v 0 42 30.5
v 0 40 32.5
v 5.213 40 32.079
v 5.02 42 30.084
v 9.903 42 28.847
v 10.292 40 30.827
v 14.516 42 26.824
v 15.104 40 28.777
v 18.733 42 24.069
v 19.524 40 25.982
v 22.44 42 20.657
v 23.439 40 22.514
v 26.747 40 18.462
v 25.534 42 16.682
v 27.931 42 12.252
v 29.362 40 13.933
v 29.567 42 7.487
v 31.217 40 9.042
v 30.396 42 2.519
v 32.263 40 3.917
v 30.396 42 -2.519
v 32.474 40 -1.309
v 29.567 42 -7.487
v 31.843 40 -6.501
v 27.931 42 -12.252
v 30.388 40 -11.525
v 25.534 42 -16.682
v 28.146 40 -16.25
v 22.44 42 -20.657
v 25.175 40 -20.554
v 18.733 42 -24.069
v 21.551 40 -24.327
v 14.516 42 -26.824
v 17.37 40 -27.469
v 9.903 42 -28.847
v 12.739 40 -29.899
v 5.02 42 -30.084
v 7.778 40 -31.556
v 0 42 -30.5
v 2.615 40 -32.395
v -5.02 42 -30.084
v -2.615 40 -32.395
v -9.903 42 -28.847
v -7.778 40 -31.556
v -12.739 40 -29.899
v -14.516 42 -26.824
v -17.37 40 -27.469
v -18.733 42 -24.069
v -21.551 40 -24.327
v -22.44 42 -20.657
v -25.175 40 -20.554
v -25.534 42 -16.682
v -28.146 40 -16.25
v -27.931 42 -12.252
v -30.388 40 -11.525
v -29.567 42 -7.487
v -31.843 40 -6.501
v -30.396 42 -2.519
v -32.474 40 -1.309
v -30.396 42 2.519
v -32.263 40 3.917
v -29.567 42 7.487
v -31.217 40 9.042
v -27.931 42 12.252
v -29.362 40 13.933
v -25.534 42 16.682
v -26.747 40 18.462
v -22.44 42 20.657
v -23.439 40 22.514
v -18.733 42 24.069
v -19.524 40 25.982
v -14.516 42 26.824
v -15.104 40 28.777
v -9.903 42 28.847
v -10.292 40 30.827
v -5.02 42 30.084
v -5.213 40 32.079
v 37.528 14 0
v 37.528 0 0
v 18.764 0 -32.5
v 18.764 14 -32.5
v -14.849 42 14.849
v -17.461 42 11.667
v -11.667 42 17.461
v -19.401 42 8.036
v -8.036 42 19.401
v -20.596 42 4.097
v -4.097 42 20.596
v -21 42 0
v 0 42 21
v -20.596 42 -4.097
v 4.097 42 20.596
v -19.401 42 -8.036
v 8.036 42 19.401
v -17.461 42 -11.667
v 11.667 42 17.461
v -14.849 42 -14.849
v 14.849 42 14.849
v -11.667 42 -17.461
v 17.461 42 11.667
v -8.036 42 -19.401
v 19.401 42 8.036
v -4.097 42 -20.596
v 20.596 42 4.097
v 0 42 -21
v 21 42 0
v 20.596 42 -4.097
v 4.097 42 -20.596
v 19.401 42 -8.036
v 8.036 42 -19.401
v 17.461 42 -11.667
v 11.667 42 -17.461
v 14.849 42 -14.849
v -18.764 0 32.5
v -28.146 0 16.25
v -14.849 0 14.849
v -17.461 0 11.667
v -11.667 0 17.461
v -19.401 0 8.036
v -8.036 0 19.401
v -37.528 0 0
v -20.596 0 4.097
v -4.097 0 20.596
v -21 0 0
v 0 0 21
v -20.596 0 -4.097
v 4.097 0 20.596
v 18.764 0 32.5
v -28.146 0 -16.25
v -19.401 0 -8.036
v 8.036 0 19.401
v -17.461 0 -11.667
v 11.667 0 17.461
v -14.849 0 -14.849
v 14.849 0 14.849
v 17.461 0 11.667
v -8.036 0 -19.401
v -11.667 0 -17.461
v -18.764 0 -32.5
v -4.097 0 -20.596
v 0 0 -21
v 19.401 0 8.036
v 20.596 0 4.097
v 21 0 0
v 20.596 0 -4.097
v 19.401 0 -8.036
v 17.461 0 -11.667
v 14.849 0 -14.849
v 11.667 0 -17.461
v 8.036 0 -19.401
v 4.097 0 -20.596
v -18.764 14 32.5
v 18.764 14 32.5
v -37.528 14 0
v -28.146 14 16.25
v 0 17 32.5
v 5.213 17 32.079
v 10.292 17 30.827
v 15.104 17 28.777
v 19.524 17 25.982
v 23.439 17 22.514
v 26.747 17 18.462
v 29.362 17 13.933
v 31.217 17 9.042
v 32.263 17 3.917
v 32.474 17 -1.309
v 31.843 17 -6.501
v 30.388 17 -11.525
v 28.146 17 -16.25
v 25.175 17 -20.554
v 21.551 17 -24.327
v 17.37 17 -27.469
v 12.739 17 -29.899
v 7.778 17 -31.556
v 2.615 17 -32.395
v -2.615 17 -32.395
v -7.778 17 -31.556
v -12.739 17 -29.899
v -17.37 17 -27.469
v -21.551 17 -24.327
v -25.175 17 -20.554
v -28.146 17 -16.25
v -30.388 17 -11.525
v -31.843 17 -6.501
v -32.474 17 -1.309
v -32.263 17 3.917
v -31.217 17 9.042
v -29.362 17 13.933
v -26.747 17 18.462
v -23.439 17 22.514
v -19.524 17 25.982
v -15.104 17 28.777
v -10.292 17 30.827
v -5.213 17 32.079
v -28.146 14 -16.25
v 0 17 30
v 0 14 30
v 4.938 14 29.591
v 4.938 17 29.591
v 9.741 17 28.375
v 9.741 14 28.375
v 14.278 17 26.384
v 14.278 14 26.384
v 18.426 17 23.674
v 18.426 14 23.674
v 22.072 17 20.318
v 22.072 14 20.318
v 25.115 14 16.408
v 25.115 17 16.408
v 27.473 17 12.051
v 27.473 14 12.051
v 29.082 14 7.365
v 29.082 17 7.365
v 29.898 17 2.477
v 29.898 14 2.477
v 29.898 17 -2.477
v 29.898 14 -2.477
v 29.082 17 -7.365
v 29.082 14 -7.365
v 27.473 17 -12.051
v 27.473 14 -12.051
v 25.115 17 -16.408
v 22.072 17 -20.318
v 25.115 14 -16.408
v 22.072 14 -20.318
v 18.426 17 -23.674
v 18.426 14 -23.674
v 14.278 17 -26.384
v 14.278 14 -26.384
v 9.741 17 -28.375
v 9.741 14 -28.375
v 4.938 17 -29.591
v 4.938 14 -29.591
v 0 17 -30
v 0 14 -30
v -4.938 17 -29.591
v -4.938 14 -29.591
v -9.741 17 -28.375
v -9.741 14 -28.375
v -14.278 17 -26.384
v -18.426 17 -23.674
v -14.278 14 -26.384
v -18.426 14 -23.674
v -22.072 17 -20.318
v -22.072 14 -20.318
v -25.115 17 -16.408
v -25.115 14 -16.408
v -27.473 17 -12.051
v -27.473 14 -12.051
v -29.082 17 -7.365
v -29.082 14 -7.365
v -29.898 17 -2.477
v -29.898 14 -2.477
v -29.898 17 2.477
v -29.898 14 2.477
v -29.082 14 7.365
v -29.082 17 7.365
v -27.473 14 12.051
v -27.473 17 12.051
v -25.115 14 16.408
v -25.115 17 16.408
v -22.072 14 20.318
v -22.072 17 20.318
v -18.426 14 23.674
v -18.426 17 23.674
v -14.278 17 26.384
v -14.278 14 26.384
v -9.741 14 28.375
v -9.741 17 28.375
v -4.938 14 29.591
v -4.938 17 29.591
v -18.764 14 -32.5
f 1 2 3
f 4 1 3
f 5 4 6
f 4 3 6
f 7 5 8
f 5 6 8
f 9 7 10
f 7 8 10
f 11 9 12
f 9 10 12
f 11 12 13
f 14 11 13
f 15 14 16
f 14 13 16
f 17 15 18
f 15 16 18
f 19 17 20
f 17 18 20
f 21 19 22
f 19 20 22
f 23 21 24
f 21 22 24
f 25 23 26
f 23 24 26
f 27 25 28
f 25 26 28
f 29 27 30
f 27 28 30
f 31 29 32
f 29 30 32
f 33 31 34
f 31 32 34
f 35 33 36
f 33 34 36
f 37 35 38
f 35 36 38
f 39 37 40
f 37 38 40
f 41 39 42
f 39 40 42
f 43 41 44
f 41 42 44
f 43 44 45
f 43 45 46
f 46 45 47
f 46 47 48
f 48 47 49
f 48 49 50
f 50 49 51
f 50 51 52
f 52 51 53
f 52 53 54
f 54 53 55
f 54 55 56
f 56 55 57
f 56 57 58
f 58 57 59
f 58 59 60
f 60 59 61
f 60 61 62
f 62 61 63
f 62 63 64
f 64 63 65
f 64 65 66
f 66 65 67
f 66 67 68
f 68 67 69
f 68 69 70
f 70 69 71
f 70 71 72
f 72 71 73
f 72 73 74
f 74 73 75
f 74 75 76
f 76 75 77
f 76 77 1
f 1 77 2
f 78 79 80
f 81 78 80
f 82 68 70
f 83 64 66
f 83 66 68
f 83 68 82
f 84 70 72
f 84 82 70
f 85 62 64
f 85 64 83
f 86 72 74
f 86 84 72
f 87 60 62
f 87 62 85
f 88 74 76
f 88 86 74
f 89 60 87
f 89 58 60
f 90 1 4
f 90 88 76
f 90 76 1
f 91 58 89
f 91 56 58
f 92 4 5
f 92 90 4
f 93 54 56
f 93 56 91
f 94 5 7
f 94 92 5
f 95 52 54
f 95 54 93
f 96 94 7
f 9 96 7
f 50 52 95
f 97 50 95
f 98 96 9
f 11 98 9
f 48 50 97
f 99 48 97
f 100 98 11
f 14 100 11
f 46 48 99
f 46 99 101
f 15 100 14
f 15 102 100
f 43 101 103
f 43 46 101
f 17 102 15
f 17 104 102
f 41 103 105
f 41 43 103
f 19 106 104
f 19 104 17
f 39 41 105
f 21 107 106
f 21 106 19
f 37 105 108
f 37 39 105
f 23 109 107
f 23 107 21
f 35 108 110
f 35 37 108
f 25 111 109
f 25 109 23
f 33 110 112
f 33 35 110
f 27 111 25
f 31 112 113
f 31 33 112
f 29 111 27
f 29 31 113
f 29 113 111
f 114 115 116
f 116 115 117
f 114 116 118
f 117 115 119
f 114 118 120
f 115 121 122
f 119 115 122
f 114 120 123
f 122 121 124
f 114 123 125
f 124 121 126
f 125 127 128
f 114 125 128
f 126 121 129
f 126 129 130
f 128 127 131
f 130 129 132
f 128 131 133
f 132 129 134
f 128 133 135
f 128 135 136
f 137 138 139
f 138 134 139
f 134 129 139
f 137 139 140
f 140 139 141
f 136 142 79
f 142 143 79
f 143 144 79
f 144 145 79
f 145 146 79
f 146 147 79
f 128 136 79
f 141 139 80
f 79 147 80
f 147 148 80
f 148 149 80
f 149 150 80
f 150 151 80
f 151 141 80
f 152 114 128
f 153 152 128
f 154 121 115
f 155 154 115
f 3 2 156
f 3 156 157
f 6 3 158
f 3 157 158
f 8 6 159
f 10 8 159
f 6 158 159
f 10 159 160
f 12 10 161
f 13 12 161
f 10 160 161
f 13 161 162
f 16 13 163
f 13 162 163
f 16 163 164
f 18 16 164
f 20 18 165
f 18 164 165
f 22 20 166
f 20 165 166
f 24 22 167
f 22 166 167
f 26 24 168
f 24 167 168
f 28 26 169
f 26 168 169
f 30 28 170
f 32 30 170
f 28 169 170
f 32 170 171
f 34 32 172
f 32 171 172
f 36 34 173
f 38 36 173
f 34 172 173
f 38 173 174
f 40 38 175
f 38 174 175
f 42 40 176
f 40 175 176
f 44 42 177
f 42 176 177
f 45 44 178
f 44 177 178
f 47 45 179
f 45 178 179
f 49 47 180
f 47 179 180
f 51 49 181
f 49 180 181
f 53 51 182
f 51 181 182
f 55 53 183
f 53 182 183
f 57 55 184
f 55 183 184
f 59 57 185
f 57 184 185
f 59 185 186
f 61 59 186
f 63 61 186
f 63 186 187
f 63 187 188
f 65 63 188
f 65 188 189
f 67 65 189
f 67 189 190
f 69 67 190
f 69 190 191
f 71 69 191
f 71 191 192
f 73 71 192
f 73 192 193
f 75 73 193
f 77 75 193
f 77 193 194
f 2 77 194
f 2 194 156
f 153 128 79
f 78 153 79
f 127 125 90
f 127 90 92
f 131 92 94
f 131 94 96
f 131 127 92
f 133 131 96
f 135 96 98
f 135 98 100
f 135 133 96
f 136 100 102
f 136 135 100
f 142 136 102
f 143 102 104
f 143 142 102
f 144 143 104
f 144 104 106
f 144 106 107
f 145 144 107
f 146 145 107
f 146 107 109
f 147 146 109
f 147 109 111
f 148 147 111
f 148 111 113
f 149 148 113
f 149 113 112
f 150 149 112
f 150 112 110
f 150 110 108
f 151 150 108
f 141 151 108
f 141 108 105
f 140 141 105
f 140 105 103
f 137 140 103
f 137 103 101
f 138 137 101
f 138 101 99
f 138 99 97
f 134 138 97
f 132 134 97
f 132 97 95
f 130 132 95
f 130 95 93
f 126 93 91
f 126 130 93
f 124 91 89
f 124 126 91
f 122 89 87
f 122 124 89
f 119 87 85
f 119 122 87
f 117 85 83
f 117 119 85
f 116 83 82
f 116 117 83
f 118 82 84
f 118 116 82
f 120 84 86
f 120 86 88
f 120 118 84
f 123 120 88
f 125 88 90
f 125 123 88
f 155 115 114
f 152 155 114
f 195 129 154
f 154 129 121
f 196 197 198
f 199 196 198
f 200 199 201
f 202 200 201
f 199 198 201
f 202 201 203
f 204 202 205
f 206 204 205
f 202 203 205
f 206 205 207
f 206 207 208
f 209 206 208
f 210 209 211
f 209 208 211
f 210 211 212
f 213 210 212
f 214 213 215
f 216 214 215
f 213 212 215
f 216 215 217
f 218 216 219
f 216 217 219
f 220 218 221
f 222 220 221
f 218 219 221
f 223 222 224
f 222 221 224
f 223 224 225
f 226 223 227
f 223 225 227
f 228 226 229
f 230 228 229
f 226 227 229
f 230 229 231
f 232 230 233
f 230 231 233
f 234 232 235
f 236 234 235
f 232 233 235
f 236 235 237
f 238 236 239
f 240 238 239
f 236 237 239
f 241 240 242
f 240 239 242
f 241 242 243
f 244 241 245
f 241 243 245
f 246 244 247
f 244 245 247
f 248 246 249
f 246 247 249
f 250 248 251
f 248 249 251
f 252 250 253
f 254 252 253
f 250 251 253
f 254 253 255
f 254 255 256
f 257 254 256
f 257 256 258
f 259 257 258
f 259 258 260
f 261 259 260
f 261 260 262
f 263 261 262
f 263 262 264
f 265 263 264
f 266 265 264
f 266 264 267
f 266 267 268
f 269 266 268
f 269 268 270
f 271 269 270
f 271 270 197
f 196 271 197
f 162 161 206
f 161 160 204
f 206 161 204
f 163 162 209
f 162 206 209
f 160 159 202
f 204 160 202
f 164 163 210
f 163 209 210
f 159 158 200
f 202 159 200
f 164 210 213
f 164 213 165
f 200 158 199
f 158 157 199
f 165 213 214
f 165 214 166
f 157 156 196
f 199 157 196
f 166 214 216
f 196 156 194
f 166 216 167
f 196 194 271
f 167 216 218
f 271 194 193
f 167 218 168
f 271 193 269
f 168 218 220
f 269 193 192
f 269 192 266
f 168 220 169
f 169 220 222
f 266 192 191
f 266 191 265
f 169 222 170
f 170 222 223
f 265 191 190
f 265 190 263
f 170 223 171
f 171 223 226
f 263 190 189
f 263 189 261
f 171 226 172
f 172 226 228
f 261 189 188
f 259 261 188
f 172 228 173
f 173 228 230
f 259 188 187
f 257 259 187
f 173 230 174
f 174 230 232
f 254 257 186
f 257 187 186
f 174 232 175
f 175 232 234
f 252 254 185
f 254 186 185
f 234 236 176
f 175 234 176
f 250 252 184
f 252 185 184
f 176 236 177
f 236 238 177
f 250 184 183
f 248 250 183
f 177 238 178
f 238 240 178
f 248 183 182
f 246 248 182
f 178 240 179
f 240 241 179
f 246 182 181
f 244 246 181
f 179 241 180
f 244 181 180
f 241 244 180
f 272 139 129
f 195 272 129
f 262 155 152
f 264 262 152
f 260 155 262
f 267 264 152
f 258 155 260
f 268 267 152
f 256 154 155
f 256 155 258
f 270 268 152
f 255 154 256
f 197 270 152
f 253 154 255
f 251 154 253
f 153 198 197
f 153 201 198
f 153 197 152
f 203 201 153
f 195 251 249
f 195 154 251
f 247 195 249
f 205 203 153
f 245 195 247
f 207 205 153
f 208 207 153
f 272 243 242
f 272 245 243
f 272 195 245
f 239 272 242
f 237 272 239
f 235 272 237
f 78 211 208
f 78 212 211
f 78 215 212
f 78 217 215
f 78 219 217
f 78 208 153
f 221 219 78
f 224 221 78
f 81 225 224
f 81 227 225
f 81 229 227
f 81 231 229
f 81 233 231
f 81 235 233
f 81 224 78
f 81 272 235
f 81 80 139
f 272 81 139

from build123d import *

# Parameters (mm, degrees)
SKETCH1_R           = 30
SKETCH1_R_2         = 21
BOSS_EXTRUDE1_DEPTH = 14
SKETCH1_3_R         = 32.5
SKETCH1_3_R_2       = 30
SKETCH1_3_R_3       = 21
BOSS_EXTRUDE2_DEPTH = 42
CUT_EXTRUDE1_START  = 14
SKETCH1_4_R         = 32.5
SKETCH1_4_R_2       = 30
CUT_EXTRUDE1_DEPTH  = 3
CHAMFER2_SIZE       = 2


with BuildPart() as part:
    # Sketch1 → Boss-Extrude1 (new body)
    # profile 1 of 8: a face of its own
    with BuildSketch(Plane(origin=(0, 0, 0), x_dir=(1, 0, 0), z_dir=(0, 1, 0))):
        Polygon((-18.763883749, -32.5), (18.763883749, -32.5), (37.527767497, 0), (18.763883749, 32.5), (-18.763883749, 32.5), (-37.527767497, 0), align=None)
        Circle(SKETCH1_R, mode=Mode.SUBTRACT)
    # profile 2 of 8: a face of its own
    with BuildSketch(Plane(origin=(0, 0, 0), x_dir=(1, 0, 0), z_dir=(0, 1, 0))):
        Circle(SKETCH1_R)
        with Locations(Location((0, 0, 0), (0, 0, 270))):
            Circle(SKETCH1_R_2, mode=Mode.SUBTRACT)
    # profile 3 of 8: a face of its own
    with BuildSketch(Plane(origin=(0, 0, 0), x_dir=(1, 0, 0), z_dir=(0, 1, 0))):
        with BuildLine():
            ThreePointArc((-5.3e-08, 32.5), (16.250000065, 28.145825585), (28.145825725, 16.249999824))
            Line((28.145825725, 16.249999824), (18.763883749, 32.5))
            Line((18.763883749, 32.5), (-5.3e-08, 32.5))
        make_face()
    # profile 4 of 8: a face of its own
    with BuildSketch(Plane(origin=(0, 0, 0), x_dir=(1, 0, 0), z_dir=(0, 1, 0))):
        with BuildLine():
            ThreePointArc((-28.14582555, 16.250000126), (-16.24999996, 28.145825646), (-5.3e-08, 32.5))
            Line((-5.3e-08, 32.5), (-18.763883749, 32.5))
            Line((-18.763883749, 32.5), (-28.14582555, 16.250000126))
        make_face()
    # profile 5 of 8: a face of its own
    with BuildSketch(Plane(origin=(0, 0, 0), x_dir=(1, 0, 0), z_dir=(0, 1, 0))):
        with BuildLine():
            Line((28.145825318, -16.250000528), (37.527767497, 0))
            Line((37.527767497, 0), (28.145825725, 16.249999824))
            ThreePointArc((28.145825725, 16.249999824), (31.392589381, 8.411618868), (32.5, 0))
            ThreePointArc((32.5, 0), (31.392589275, -8.41161926), (28.145825318, -16.250000528))
        make_face()
    # profile 6 of 8: a face of its own
    with BuildSketch(Plane(origin=(0, 0, 0), x_dir=(1, 0, 0), z_dir=(0, 1, 0))):
        with BuildLine():
            Line((18.763883749, -32.5), (28.145825318, -16.250000528))
            ThreePointArc((28.145825318, -16.250000528), (16.249999715, -28.145825788), (-4.8e-08, -32.5))
            Line((-4.8e-08, -32.5), (18.763883749, -32.5))
        make_face()
    # profile 7 of 8: a face of its own
    with BuildSketch(Plane(origin=(0, 0, 0), x_dir=(1, 0, 0), z_dir=(0, 1, 0))):
        with BuildLine():
            Line((-18.763883749, -32.5), (-4.8e-08, -32.5))
            ThreePointArc((-4.8e-08, -32.5), (-16.250000055, -28.145825591), (-28.145825663, -16.249999931))
            Line((-28.145825663, -16.249999931), (-18.763883749, -32.5))
        make_face()
    # profile 8 of 8: a face of its own
    with BuildSketch(Plane(origin=(0, 0, 0), x_dir=(1, 0, 0), z_dir=(0, 1, 0))):
        with BuildLine():
            ThreePointArc((-28.145825663, -16.249999931), (-32.5, 1.12e-07), (-28.14582555, 16.250000126))
            Line((-28.14582555, 16.250000126), (-37.527767497, 0))
            Line((-37.527767497, 0), (-28.145825663, -16.249999931))
        make_face()
    extrude(amount=BOSS_EXTRUDE1_DEPTH)

    # Sketch1<3> → Boss-Extrude2 (add)
    # profile 1 of 2: a face of its own
    with BuildSketch(Plane(origin=(0, 0, 0), x_dir=(1, 0, 0), z_dir=(0, 1, 0))):
        with Locations(Location((0, 0, 0), (0, 0, 270))):
            Circle(SKETCH1_3_R)
        Circle(SKETCH1_3_R_2, mode=Mode.SUBTRACT)
    # profile 2 of 2: a face of its own
    with BuildSketch(Plane(origin=(0, 0, 0), x_dir=(1, 0, 0), z_dir=(0, 1, 0))):
        Circle(SKETCH1_3_R_2)
        with Locations(Location((0, 0, 0), (0, 0, 270))):
            Circle(SKETCH1_3_R_3, mode=Mode.SUBTRACT)
    extrude(amount=BOSS_EXTRUDE2_DEPTH)

    # Sketch1<4> → Cut-Extrude1 (cut)
    with BuildSketch(Plane(origin=(0, 0, 0), x_dir=(1, 0, 0), z_dir=(0, 1, 0)).offset(CUT_EXTRUDE1_START)):
        with Locations(Location((0, 0, 0), (0, 0, 90))):
            Circle(SKETCH1_4_R)
        with Locations(Location((0, 0, 0), (0, 0, 270))):
            Circle(SKETCH1_4_R_2, mode=Mode.SUBTRACT)
    extrude(amount=CUT_EXTRUDE1_DEPTH, mode=Mode.SUBTRACT)

    # Chamfer2
    chamfer2_edges = [part.edges().sort_by_distance(p)[0] for p in [
        (0, 42, -32.5),
    ]]
    chamfer(chamfer2_edges, length=CHAMFER2_SIZE)


solid = part.part
